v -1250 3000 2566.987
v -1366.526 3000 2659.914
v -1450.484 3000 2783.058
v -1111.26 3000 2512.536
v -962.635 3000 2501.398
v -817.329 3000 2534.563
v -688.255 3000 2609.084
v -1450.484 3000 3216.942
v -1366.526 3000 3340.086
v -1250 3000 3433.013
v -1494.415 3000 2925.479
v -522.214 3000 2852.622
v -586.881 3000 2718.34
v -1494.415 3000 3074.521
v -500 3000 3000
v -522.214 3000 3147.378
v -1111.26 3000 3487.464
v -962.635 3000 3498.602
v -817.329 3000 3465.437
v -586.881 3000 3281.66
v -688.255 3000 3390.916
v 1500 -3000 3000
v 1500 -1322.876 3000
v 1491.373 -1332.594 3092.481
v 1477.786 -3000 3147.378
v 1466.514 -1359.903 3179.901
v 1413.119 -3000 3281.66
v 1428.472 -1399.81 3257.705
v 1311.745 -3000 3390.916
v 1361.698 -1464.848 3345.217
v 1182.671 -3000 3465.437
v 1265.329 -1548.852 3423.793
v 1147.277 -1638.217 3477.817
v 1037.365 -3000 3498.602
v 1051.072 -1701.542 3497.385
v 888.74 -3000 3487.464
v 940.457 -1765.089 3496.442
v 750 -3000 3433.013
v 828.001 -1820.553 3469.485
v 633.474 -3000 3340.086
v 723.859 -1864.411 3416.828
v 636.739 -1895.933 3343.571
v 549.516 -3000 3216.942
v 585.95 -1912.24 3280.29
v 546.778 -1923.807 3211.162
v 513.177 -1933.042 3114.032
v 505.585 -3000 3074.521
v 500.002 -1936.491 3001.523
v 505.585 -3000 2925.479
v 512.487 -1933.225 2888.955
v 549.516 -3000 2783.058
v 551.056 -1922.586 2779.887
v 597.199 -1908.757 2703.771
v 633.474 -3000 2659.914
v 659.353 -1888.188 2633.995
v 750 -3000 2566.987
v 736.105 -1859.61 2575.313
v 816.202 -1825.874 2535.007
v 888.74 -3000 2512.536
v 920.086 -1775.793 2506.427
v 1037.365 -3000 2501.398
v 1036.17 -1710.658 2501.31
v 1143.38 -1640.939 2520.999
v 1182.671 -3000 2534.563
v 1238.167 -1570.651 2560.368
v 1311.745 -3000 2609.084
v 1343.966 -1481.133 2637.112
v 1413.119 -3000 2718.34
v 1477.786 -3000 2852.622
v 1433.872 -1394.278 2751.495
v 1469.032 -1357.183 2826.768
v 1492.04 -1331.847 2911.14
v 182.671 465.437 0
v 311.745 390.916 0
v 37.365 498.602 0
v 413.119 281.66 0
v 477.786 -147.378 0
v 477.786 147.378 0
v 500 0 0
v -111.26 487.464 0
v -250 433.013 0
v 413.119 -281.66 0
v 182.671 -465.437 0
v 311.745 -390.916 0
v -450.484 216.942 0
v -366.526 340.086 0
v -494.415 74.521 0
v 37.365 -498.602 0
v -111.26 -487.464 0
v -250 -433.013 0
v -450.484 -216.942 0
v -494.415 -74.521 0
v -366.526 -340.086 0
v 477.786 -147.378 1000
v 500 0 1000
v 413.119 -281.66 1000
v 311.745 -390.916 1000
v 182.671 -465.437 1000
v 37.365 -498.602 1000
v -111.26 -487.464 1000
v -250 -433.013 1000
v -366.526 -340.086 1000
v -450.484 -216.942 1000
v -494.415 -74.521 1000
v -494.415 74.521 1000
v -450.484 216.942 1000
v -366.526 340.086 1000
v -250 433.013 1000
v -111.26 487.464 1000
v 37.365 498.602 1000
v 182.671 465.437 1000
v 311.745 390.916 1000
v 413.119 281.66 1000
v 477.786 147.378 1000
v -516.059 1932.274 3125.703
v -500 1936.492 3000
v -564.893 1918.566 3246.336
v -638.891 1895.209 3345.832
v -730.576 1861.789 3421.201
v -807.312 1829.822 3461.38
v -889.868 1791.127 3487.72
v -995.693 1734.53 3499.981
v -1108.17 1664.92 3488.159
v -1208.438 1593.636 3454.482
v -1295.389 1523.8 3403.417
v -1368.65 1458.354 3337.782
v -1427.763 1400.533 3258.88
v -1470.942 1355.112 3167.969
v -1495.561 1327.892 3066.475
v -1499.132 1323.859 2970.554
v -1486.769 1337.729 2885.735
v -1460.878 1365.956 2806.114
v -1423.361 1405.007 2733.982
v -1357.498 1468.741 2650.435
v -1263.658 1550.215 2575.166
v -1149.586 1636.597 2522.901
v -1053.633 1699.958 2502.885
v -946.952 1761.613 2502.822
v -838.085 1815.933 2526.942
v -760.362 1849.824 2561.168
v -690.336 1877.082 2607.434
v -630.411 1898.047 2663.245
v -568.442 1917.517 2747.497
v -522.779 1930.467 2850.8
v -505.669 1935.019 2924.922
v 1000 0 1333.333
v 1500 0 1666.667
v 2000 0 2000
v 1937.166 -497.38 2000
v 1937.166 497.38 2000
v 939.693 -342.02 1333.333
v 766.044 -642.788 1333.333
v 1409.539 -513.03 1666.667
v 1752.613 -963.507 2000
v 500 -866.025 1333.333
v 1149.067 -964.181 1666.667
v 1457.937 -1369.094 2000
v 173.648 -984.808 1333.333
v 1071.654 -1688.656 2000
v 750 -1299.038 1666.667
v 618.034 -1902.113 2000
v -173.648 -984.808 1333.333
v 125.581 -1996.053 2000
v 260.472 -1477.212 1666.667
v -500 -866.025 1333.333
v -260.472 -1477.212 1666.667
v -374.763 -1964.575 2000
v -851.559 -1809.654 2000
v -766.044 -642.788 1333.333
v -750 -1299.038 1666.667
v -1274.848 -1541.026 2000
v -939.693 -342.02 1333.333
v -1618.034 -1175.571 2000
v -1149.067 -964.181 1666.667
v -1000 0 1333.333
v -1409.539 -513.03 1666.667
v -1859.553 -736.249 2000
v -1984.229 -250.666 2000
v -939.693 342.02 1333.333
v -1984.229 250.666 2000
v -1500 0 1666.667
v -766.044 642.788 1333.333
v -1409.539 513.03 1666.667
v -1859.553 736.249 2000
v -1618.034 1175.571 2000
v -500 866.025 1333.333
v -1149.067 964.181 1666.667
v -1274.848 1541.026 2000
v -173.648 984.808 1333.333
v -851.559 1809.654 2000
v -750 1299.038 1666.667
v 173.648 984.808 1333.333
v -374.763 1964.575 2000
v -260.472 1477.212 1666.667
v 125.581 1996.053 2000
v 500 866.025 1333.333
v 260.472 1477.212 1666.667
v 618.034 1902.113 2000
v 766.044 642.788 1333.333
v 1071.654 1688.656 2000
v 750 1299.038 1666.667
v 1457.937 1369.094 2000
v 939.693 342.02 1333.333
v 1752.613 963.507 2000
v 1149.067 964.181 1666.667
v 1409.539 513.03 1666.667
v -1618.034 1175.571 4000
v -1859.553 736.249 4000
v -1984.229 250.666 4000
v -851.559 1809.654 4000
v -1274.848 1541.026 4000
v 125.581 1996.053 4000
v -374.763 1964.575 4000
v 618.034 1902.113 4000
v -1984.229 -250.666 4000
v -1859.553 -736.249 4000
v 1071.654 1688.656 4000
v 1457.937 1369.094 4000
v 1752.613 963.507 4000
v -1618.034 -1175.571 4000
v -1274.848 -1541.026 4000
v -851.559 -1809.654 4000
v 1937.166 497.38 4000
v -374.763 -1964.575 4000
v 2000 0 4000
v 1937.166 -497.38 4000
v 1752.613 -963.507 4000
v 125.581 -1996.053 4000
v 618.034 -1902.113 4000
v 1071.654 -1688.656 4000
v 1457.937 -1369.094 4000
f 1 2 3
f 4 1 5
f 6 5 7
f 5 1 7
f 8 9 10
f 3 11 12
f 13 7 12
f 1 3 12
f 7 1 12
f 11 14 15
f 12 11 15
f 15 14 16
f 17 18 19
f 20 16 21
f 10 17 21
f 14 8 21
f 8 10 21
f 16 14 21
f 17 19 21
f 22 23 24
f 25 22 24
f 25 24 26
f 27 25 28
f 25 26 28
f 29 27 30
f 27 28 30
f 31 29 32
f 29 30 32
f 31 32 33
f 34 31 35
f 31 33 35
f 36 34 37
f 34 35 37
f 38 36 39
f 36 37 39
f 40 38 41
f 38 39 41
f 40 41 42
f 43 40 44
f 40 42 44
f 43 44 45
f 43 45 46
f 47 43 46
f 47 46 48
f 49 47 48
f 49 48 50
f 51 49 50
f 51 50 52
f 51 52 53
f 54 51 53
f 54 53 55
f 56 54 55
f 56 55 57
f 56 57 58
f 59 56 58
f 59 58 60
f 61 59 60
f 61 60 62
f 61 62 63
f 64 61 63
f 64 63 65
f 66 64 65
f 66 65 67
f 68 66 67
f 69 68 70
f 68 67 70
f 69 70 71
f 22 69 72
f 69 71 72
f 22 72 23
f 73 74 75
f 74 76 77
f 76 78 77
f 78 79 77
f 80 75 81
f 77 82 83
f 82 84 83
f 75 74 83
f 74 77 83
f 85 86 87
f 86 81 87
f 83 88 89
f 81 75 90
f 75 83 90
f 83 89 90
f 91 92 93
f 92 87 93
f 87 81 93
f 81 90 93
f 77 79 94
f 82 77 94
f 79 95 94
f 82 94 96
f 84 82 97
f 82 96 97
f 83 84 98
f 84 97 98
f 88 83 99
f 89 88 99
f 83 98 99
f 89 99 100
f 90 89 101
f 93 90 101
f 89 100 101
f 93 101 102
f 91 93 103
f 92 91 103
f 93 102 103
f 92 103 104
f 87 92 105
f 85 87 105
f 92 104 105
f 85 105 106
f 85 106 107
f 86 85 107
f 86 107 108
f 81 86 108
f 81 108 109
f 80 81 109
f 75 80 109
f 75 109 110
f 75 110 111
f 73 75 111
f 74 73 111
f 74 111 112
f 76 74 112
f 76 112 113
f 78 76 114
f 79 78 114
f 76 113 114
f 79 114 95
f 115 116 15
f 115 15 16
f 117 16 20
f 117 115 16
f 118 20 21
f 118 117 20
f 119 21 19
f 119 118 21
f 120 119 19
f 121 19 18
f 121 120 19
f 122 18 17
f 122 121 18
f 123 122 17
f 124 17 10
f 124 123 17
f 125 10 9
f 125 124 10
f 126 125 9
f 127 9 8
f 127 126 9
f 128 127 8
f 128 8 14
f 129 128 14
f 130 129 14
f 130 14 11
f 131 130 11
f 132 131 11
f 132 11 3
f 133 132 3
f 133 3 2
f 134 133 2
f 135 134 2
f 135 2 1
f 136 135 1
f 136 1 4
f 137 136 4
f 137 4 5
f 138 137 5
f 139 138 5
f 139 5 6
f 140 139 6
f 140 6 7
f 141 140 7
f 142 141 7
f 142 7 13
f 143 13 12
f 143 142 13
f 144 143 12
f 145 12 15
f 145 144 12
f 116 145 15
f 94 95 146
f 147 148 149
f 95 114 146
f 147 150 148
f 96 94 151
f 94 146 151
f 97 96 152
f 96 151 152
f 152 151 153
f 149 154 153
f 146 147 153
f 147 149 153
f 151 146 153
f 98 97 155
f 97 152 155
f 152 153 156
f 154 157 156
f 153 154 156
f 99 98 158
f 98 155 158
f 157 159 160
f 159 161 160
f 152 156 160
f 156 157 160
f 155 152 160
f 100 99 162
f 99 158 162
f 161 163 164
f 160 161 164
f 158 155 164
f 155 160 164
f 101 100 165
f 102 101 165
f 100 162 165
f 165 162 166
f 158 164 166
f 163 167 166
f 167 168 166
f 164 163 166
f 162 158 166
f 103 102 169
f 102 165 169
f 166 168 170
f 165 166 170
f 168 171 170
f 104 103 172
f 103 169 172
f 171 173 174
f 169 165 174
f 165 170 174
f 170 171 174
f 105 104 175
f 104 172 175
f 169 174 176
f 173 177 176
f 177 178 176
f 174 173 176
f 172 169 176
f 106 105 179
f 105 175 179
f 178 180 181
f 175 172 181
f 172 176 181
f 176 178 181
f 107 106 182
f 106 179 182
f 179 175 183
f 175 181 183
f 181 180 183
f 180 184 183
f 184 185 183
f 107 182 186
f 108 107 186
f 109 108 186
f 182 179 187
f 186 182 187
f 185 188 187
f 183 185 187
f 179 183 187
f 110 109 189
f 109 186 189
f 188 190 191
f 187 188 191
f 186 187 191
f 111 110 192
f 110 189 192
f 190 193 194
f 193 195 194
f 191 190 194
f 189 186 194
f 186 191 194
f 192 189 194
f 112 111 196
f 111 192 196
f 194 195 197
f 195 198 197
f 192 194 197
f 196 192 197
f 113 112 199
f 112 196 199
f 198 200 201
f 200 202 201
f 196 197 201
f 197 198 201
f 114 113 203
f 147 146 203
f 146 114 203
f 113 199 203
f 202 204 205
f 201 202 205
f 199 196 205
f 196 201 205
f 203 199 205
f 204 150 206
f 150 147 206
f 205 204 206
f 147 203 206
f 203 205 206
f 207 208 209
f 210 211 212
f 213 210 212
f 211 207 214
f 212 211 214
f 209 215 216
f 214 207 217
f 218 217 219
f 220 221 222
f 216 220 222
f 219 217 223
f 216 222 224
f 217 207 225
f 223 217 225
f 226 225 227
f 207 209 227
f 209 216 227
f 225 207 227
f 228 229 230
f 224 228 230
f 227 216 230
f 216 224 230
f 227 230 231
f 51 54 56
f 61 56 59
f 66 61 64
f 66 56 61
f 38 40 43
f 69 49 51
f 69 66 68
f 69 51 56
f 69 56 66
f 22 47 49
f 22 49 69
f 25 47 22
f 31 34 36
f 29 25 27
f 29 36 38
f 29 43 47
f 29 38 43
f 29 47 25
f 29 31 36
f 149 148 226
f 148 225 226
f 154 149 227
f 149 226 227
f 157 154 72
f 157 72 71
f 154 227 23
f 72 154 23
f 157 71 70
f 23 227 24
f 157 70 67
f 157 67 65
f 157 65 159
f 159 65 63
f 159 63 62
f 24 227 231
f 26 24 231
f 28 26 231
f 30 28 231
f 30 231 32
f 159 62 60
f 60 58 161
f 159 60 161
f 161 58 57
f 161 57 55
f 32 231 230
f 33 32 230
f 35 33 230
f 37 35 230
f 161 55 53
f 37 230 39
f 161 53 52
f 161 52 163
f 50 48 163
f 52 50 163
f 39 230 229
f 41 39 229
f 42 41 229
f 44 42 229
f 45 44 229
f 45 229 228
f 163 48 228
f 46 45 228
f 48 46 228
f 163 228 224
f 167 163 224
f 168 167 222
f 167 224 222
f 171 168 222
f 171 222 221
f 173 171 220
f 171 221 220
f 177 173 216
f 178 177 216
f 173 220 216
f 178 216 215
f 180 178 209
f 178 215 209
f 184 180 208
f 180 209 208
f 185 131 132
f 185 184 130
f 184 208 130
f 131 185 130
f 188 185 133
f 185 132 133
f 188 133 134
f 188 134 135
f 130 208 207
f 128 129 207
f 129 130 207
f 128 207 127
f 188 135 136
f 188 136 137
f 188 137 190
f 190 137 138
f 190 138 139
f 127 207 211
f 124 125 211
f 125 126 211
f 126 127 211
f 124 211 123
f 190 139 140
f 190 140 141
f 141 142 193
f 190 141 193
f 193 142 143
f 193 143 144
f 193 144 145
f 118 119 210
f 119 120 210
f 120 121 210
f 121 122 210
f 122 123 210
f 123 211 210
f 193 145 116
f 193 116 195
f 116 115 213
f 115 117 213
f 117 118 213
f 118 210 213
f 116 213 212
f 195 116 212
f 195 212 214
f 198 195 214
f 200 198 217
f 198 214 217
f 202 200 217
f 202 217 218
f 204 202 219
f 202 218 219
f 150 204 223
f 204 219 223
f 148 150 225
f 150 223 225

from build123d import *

# Parameters (mm, degrees)
F2_R     = 500
F3_DEPTH = 3000
F4_R     = 500
F5_DEPTH = 3000


with BuildPart() as f1:
    # F0 (on Front) → F1 (revolve)
    with BuildSketch(Plane.XZ):
        Polygon((0, 4000), (0, 0), (500, 0), (500, 1000), (2000, 2000), (2000, 4000), align=None)
    revolve(axis=Axis((0, 0, 2000), (0, 0, -1)))

    # F2 (on Front) → F3 (join)
    with BuildSketch(Plane.XZ):
        with Locations((1000, 3000)):
            Circle(F2_R)
    extrude(amount=F3_DEPTH)

    # F4 (on Front) → F5 (join)
    with BuildSketch(Plane.XZ):
        with Locations((-1000, 3000)):
            Circle(F4_R)
    extrude(amount=-F5_DEPTH)


solid = f1.part
